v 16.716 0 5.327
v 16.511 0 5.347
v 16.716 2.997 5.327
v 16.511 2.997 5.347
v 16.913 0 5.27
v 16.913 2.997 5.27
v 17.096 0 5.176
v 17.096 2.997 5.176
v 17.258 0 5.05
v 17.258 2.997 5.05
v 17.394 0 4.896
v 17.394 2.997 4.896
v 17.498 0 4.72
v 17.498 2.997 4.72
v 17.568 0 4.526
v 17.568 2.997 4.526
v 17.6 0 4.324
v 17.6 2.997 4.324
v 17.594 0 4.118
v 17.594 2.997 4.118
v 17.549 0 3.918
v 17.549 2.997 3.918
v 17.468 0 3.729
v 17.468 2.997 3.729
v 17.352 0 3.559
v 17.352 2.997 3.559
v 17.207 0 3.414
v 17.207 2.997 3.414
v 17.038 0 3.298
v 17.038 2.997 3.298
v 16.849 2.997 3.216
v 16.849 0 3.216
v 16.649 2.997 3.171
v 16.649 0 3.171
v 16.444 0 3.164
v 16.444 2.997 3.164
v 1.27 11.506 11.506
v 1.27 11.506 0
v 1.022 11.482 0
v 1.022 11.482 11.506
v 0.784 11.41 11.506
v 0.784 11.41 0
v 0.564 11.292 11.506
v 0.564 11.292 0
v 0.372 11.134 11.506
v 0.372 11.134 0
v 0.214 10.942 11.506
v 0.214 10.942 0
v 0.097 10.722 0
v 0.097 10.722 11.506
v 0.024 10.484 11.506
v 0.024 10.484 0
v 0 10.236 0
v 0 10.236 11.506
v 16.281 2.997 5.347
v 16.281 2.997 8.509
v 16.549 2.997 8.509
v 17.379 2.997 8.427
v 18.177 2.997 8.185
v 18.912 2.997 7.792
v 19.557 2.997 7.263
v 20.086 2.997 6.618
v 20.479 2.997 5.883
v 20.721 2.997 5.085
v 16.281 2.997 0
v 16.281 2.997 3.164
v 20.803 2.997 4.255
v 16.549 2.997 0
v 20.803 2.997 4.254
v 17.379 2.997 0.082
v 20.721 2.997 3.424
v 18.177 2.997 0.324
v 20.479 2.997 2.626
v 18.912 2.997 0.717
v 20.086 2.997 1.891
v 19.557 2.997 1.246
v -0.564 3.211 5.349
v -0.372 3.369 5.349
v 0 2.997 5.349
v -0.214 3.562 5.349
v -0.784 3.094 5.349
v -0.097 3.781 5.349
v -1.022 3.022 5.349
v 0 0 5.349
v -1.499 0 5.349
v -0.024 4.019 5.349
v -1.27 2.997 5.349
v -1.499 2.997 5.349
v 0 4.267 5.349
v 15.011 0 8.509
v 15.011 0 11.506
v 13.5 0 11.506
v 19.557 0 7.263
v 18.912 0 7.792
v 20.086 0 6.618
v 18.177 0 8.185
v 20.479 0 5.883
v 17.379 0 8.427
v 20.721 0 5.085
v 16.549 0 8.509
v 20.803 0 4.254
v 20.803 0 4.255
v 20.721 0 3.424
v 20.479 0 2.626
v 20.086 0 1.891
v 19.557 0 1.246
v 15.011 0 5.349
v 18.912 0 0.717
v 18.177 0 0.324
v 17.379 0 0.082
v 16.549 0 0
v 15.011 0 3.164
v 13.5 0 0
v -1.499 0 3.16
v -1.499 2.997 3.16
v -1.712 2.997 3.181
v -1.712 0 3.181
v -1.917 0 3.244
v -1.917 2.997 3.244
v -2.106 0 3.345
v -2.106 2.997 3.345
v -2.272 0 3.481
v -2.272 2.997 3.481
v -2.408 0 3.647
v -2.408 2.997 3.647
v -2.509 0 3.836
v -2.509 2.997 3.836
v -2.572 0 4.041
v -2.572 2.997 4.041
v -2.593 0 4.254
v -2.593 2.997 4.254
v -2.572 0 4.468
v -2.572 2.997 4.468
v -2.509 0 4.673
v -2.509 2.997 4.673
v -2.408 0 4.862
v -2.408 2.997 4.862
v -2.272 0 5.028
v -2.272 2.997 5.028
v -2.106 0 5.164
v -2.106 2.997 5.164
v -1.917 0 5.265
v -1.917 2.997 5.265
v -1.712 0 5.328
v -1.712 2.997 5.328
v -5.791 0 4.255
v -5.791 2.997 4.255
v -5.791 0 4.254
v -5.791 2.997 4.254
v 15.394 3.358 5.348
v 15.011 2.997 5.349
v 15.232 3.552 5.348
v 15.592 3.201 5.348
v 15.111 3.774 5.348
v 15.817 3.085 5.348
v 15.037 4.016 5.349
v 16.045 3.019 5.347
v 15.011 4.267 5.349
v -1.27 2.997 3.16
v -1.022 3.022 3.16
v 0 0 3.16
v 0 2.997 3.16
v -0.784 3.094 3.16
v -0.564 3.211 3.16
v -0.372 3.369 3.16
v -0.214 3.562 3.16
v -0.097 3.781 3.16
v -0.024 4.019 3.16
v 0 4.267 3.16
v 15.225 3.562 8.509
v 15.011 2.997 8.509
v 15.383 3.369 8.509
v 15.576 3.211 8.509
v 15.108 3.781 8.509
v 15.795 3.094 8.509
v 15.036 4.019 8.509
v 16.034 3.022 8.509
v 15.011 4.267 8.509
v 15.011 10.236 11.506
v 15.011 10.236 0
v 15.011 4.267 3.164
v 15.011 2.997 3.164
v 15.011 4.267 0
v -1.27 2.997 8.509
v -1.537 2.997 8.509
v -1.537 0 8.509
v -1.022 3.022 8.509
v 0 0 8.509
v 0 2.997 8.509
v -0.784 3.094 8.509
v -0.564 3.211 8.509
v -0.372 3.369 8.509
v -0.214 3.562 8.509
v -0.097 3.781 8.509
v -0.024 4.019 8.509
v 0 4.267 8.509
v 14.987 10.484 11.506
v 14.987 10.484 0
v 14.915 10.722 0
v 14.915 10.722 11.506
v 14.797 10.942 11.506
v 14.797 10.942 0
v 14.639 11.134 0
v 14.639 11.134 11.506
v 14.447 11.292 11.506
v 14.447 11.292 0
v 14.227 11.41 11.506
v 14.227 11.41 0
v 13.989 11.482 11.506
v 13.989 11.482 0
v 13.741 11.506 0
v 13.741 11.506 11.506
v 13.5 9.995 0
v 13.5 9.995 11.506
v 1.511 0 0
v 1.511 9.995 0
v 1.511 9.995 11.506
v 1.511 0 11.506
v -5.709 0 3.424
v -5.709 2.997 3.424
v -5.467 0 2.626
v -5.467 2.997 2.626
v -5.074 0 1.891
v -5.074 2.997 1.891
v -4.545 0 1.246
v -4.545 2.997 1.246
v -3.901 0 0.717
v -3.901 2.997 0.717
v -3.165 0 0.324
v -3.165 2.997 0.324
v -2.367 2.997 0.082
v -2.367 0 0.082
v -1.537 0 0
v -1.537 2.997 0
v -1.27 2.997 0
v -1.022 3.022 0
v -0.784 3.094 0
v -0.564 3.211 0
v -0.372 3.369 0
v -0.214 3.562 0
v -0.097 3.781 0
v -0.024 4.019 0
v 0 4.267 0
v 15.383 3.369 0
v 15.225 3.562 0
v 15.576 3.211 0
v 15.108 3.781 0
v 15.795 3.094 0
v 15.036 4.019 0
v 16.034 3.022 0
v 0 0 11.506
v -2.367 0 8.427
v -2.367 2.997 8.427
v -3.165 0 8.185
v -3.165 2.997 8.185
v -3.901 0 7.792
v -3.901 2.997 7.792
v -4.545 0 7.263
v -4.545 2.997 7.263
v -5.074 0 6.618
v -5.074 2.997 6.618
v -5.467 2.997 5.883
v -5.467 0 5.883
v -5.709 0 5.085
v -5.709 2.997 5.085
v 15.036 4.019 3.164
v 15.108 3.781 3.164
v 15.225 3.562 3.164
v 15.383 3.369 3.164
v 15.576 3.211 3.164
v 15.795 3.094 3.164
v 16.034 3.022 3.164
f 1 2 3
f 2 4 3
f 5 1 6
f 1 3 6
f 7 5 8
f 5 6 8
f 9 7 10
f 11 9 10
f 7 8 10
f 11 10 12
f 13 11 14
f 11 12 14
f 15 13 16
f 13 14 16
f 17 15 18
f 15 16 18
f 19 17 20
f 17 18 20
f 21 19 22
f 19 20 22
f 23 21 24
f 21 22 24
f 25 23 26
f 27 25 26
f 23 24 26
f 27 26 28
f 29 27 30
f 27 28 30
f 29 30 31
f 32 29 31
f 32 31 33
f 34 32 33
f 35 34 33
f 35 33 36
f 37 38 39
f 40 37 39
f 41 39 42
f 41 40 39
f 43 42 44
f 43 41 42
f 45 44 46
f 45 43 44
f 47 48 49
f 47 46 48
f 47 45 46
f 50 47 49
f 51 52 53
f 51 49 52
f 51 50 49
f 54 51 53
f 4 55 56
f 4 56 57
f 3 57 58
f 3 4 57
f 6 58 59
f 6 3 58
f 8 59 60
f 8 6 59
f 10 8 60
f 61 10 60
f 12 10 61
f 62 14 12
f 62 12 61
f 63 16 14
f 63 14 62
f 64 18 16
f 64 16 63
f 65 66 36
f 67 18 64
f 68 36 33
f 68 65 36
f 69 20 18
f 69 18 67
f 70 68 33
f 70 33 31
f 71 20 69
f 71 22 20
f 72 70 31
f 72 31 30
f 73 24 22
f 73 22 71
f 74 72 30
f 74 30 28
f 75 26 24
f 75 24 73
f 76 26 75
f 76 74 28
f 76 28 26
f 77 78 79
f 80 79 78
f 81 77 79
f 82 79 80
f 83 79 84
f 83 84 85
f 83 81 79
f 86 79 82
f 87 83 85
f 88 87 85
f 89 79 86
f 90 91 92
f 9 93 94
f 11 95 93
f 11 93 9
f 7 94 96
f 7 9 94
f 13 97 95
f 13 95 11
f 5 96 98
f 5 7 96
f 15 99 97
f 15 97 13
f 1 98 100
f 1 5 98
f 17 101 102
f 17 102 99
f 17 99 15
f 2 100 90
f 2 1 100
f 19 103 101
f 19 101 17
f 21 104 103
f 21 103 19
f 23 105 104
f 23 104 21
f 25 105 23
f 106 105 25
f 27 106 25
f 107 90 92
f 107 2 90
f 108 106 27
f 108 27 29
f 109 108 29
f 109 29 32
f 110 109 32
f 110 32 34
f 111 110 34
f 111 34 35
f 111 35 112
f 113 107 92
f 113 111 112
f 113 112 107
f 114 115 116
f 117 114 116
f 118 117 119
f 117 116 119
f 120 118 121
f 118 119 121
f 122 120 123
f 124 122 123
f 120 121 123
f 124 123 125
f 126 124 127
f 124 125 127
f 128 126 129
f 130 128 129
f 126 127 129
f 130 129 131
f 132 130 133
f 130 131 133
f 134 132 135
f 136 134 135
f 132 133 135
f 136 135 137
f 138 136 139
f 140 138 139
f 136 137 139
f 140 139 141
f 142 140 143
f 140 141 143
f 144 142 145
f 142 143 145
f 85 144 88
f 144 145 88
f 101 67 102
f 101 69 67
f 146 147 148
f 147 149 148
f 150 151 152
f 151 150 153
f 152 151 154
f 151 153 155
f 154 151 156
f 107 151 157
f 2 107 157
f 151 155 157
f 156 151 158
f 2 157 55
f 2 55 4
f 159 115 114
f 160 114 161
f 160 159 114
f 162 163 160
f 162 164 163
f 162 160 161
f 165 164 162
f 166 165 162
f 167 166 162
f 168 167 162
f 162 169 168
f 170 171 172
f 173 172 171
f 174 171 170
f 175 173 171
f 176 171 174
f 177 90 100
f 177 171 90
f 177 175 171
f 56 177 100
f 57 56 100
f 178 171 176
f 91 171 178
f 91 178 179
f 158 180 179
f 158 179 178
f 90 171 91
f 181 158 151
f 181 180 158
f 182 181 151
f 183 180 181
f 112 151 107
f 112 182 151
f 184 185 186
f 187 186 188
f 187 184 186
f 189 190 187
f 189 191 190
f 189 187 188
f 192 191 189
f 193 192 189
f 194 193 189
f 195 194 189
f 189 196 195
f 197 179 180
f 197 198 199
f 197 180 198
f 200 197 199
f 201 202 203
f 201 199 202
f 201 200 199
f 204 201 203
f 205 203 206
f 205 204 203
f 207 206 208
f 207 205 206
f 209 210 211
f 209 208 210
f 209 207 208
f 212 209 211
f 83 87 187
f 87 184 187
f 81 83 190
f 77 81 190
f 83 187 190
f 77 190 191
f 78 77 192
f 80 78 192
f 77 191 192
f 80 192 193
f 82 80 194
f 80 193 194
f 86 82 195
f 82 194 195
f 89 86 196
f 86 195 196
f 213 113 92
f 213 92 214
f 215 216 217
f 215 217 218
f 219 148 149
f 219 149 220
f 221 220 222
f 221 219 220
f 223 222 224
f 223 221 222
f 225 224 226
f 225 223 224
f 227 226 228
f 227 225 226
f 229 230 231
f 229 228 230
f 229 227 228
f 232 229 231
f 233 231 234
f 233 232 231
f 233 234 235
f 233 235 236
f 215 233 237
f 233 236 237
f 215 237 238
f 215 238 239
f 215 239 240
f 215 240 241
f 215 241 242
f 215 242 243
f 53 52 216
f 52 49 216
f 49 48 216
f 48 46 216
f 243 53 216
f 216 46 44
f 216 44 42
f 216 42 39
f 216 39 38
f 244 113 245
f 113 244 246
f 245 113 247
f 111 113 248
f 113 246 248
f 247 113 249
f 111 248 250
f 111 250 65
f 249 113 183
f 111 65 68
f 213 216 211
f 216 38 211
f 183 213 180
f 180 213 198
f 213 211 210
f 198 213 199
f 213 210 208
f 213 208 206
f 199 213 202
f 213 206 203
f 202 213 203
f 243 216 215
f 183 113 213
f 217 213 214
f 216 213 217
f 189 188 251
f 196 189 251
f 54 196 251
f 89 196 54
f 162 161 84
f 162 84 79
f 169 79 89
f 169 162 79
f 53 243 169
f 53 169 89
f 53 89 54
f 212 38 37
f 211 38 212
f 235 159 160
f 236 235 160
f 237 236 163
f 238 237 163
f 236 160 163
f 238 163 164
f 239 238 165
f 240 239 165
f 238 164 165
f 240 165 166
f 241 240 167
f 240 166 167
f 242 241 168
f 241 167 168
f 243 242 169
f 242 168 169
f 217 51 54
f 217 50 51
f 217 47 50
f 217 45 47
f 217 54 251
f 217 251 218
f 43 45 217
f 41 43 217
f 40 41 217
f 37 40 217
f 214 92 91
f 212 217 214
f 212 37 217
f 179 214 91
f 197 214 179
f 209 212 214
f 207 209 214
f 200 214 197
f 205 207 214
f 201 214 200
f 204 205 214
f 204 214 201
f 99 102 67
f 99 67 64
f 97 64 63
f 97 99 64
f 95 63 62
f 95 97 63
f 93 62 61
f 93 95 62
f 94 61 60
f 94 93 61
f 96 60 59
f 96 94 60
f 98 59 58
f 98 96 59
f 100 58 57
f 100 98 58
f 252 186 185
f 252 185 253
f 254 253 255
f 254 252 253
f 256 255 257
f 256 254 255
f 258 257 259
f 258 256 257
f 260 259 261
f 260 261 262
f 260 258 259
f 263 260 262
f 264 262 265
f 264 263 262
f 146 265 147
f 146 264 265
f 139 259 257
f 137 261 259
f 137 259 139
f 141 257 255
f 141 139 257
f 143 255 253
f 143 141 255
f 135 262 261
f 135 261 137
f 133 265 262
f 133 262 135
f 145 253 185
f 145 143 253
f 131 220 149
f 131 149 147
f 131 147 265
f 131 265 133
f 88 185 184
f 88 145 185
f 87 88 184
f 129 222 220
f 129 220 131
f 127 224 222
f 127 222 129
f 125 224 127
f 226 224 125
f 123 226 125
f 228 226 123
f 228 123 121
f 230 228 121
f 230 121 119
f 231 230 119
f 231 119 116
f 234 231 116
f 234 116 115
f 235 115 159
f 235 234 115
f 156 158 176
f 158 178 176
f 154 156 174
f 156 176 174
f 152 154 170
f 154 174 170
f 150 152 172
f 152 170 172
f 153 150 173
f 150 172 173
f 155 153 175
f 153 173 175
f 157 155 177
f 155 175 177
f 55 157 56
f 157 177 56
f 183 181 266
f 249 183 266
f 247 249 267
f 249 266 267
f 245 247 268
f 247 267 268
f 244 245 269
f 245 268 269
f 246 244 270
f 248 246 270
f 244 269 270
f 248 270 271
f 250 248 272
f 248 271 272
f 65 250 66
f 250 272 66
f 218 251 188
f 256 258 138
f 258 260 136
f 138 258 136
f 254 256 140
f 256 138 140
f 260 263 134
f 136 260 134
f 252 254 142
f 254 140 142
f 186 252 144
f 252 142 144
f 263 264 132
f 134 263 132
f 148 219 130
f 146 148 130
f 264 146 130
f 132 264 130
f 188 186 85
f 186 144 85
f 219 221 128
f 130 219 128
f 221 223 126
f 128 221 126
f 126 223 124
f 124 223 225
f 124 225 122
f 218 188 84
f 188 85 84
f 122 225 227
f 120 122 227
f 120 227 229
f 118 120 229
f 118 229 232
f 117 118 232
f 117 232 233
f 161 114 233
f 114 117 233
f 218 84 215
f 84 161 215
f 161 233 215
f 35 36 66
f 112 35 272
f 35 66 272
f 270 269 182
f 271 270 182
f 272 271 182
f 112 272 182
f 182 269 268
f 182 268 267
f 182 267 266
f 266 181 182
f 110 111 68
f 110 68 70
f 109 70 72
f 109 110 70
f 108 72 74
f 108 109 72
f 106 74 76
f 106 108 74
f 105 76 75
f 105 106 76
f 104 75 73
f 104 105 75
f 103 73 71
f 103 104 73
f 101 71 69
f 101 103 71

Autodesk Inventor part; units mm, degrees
ref_plane "YZ Plane" through (0, 0, 0) normal (1, 0, 0) x (0, 1, 0)
ref_plane "XZ Plane" through (0, 0, 0) normal (0, 1, 0) x (-1, 0, 0)
ref_plane "XY Plane" through (0, 0, 0) normal (0, 0, 1) x (1, 0, 0)
sketch "Sketch1" plane through (0, 0, 0) normal (0, 0, 1) x (1, 0, 0)
  line L0 (0, 2.9972) -> (0, 11.5062)
  line L1 (0, 11.5062) -> (15.0114, 11.5062)
  line L2 (15.0114, 11.5062) -> (15.0114, 2.9972)
  line L3 (13.5001, 0) -> (13.5001, 9.9949)
  line L4 (13.5001, 9.9949) -> (1.5113, 9.9949)
  line L5 (1.5113, 9.9949) -> (1.5113, 0)
  line L6 (15.0114, 2.9972) -> (20.8026, 2.9972)
  line L7 (20.8026, 2.9972) -> (20.8026, 0)
  line L8 (20.8026, 0) -> (15.0113, 0)
  line L9 (15.0113, 0) -> (13.5001, 0)
  line L10 (0, 0) -> (-5.7912, 0)
  line L11 (-5.7912, 2.9972) -> (0, 2.9972)
  line L12 (0, 0) -> (1.5113, 0)
  line L13 (-5.7912, 2.9972) -> (-5.7912, 0)
  dimension "d0" = 11.5062
  dimension "d2" = 15.0114
  dimension "d3" = 11.9888
  dimension "d4" = 0
  dimension "d5" = 0
  dimension "d6" = 0
  dimension "d7" = 5.7912
  dimension "d8" = 5.7912
  dimension "d9" = 2.9972
  dimension "d10" = 2.9972
extrude "Extrusion1" add sketch "Sketch1" along normal blind 11.5062
sketch "Sketch2" plane through (0, 0, 11.5062) normal (0, 0, 1) x (1, 0, 0)
  line L0 (15.0114, 2.9972) -> (20.8026, 2.9972)
  line L1 (20.8026, 2.9972) -> (20.8026, 0)
  line L2 (20.8026, 0) -> (15.0114, 0)
  line L3 (15.0114, 0) -> (15.0114, 2.9972)
  line L4 (0, 2.9972) -> (-5.7912, 2.9972)
  line L5 (-5.7912, 2.9972) -> (-5.7912, 0)
  line L6 (-5.7912, 0) -> (0, 0)
  line L7 (0, 0) -> (0, 2.9972)
  point P0 (0, 0)
extrude "Extrusion2" cut sketch "Sketch2" against normal blind 2.9972
sketch "Sketch3" plane through (15.0114, 2.9972, 0) normal (0, 1, 0) x (1, 0, 0)
  line L0 (0, 0) -> (0, -8.509) projected
  arc A0 (1.4999, -5.3467) -> (1.4325, -3.1643) centre (1.4986, -4.2545) ccw
  arc A1 (-16.51, -3.1604) -> (-16.51, -5.3486) centre (-16.51, -4.2545) ccw
  line L1 (-15.0114, 0) -> (-15.0114, -11.5062) projected
  line L2 (-16.51, -3.1604) -> (-15.0114, -3.1604)
  line L3 (-15.0114, -3.1604) -> (-15.0114, -5.3486)
  line L4 (-15.0114, -5.3486) -> (-16.51, -5.3486)
  line L5 (1.4325, -3.1643) -> (0, -3.1643)
  line L6 (0, -3.1643) -> (0, -5.3486)
  line L7 (0, -5.3486) -> (1.4999, -5.3467)
  dimension "d15" = 2.1844
  dimension "d17" = 1.4986
  dimension "d18" = 1.4986
extrude "Extrusion3" cut sketch "Sketch3" against normal blind 50.8
fillet "Fillet1" radius 4.2545 4 edges at (20.8026, 1.4986, 8.509) (20.8026, 1.4986, 0) (-5.7912, 1.4986, 8.509) (-5.7912, 1.4986, 0)
fillet "Fillet2" radius 1.27 6 edges at (0, 2.9972, 1.5802) (0, 2.9972, 6.9288) (0, 11.5062, 5.7531) (15.0114, 11.5062, 5.7531) (15.0114, 2.9972, 1.5822) (15.0114, 2.9972, 6.9288)
properties part number "Mount_Motor" material "Nylon 6/6"
